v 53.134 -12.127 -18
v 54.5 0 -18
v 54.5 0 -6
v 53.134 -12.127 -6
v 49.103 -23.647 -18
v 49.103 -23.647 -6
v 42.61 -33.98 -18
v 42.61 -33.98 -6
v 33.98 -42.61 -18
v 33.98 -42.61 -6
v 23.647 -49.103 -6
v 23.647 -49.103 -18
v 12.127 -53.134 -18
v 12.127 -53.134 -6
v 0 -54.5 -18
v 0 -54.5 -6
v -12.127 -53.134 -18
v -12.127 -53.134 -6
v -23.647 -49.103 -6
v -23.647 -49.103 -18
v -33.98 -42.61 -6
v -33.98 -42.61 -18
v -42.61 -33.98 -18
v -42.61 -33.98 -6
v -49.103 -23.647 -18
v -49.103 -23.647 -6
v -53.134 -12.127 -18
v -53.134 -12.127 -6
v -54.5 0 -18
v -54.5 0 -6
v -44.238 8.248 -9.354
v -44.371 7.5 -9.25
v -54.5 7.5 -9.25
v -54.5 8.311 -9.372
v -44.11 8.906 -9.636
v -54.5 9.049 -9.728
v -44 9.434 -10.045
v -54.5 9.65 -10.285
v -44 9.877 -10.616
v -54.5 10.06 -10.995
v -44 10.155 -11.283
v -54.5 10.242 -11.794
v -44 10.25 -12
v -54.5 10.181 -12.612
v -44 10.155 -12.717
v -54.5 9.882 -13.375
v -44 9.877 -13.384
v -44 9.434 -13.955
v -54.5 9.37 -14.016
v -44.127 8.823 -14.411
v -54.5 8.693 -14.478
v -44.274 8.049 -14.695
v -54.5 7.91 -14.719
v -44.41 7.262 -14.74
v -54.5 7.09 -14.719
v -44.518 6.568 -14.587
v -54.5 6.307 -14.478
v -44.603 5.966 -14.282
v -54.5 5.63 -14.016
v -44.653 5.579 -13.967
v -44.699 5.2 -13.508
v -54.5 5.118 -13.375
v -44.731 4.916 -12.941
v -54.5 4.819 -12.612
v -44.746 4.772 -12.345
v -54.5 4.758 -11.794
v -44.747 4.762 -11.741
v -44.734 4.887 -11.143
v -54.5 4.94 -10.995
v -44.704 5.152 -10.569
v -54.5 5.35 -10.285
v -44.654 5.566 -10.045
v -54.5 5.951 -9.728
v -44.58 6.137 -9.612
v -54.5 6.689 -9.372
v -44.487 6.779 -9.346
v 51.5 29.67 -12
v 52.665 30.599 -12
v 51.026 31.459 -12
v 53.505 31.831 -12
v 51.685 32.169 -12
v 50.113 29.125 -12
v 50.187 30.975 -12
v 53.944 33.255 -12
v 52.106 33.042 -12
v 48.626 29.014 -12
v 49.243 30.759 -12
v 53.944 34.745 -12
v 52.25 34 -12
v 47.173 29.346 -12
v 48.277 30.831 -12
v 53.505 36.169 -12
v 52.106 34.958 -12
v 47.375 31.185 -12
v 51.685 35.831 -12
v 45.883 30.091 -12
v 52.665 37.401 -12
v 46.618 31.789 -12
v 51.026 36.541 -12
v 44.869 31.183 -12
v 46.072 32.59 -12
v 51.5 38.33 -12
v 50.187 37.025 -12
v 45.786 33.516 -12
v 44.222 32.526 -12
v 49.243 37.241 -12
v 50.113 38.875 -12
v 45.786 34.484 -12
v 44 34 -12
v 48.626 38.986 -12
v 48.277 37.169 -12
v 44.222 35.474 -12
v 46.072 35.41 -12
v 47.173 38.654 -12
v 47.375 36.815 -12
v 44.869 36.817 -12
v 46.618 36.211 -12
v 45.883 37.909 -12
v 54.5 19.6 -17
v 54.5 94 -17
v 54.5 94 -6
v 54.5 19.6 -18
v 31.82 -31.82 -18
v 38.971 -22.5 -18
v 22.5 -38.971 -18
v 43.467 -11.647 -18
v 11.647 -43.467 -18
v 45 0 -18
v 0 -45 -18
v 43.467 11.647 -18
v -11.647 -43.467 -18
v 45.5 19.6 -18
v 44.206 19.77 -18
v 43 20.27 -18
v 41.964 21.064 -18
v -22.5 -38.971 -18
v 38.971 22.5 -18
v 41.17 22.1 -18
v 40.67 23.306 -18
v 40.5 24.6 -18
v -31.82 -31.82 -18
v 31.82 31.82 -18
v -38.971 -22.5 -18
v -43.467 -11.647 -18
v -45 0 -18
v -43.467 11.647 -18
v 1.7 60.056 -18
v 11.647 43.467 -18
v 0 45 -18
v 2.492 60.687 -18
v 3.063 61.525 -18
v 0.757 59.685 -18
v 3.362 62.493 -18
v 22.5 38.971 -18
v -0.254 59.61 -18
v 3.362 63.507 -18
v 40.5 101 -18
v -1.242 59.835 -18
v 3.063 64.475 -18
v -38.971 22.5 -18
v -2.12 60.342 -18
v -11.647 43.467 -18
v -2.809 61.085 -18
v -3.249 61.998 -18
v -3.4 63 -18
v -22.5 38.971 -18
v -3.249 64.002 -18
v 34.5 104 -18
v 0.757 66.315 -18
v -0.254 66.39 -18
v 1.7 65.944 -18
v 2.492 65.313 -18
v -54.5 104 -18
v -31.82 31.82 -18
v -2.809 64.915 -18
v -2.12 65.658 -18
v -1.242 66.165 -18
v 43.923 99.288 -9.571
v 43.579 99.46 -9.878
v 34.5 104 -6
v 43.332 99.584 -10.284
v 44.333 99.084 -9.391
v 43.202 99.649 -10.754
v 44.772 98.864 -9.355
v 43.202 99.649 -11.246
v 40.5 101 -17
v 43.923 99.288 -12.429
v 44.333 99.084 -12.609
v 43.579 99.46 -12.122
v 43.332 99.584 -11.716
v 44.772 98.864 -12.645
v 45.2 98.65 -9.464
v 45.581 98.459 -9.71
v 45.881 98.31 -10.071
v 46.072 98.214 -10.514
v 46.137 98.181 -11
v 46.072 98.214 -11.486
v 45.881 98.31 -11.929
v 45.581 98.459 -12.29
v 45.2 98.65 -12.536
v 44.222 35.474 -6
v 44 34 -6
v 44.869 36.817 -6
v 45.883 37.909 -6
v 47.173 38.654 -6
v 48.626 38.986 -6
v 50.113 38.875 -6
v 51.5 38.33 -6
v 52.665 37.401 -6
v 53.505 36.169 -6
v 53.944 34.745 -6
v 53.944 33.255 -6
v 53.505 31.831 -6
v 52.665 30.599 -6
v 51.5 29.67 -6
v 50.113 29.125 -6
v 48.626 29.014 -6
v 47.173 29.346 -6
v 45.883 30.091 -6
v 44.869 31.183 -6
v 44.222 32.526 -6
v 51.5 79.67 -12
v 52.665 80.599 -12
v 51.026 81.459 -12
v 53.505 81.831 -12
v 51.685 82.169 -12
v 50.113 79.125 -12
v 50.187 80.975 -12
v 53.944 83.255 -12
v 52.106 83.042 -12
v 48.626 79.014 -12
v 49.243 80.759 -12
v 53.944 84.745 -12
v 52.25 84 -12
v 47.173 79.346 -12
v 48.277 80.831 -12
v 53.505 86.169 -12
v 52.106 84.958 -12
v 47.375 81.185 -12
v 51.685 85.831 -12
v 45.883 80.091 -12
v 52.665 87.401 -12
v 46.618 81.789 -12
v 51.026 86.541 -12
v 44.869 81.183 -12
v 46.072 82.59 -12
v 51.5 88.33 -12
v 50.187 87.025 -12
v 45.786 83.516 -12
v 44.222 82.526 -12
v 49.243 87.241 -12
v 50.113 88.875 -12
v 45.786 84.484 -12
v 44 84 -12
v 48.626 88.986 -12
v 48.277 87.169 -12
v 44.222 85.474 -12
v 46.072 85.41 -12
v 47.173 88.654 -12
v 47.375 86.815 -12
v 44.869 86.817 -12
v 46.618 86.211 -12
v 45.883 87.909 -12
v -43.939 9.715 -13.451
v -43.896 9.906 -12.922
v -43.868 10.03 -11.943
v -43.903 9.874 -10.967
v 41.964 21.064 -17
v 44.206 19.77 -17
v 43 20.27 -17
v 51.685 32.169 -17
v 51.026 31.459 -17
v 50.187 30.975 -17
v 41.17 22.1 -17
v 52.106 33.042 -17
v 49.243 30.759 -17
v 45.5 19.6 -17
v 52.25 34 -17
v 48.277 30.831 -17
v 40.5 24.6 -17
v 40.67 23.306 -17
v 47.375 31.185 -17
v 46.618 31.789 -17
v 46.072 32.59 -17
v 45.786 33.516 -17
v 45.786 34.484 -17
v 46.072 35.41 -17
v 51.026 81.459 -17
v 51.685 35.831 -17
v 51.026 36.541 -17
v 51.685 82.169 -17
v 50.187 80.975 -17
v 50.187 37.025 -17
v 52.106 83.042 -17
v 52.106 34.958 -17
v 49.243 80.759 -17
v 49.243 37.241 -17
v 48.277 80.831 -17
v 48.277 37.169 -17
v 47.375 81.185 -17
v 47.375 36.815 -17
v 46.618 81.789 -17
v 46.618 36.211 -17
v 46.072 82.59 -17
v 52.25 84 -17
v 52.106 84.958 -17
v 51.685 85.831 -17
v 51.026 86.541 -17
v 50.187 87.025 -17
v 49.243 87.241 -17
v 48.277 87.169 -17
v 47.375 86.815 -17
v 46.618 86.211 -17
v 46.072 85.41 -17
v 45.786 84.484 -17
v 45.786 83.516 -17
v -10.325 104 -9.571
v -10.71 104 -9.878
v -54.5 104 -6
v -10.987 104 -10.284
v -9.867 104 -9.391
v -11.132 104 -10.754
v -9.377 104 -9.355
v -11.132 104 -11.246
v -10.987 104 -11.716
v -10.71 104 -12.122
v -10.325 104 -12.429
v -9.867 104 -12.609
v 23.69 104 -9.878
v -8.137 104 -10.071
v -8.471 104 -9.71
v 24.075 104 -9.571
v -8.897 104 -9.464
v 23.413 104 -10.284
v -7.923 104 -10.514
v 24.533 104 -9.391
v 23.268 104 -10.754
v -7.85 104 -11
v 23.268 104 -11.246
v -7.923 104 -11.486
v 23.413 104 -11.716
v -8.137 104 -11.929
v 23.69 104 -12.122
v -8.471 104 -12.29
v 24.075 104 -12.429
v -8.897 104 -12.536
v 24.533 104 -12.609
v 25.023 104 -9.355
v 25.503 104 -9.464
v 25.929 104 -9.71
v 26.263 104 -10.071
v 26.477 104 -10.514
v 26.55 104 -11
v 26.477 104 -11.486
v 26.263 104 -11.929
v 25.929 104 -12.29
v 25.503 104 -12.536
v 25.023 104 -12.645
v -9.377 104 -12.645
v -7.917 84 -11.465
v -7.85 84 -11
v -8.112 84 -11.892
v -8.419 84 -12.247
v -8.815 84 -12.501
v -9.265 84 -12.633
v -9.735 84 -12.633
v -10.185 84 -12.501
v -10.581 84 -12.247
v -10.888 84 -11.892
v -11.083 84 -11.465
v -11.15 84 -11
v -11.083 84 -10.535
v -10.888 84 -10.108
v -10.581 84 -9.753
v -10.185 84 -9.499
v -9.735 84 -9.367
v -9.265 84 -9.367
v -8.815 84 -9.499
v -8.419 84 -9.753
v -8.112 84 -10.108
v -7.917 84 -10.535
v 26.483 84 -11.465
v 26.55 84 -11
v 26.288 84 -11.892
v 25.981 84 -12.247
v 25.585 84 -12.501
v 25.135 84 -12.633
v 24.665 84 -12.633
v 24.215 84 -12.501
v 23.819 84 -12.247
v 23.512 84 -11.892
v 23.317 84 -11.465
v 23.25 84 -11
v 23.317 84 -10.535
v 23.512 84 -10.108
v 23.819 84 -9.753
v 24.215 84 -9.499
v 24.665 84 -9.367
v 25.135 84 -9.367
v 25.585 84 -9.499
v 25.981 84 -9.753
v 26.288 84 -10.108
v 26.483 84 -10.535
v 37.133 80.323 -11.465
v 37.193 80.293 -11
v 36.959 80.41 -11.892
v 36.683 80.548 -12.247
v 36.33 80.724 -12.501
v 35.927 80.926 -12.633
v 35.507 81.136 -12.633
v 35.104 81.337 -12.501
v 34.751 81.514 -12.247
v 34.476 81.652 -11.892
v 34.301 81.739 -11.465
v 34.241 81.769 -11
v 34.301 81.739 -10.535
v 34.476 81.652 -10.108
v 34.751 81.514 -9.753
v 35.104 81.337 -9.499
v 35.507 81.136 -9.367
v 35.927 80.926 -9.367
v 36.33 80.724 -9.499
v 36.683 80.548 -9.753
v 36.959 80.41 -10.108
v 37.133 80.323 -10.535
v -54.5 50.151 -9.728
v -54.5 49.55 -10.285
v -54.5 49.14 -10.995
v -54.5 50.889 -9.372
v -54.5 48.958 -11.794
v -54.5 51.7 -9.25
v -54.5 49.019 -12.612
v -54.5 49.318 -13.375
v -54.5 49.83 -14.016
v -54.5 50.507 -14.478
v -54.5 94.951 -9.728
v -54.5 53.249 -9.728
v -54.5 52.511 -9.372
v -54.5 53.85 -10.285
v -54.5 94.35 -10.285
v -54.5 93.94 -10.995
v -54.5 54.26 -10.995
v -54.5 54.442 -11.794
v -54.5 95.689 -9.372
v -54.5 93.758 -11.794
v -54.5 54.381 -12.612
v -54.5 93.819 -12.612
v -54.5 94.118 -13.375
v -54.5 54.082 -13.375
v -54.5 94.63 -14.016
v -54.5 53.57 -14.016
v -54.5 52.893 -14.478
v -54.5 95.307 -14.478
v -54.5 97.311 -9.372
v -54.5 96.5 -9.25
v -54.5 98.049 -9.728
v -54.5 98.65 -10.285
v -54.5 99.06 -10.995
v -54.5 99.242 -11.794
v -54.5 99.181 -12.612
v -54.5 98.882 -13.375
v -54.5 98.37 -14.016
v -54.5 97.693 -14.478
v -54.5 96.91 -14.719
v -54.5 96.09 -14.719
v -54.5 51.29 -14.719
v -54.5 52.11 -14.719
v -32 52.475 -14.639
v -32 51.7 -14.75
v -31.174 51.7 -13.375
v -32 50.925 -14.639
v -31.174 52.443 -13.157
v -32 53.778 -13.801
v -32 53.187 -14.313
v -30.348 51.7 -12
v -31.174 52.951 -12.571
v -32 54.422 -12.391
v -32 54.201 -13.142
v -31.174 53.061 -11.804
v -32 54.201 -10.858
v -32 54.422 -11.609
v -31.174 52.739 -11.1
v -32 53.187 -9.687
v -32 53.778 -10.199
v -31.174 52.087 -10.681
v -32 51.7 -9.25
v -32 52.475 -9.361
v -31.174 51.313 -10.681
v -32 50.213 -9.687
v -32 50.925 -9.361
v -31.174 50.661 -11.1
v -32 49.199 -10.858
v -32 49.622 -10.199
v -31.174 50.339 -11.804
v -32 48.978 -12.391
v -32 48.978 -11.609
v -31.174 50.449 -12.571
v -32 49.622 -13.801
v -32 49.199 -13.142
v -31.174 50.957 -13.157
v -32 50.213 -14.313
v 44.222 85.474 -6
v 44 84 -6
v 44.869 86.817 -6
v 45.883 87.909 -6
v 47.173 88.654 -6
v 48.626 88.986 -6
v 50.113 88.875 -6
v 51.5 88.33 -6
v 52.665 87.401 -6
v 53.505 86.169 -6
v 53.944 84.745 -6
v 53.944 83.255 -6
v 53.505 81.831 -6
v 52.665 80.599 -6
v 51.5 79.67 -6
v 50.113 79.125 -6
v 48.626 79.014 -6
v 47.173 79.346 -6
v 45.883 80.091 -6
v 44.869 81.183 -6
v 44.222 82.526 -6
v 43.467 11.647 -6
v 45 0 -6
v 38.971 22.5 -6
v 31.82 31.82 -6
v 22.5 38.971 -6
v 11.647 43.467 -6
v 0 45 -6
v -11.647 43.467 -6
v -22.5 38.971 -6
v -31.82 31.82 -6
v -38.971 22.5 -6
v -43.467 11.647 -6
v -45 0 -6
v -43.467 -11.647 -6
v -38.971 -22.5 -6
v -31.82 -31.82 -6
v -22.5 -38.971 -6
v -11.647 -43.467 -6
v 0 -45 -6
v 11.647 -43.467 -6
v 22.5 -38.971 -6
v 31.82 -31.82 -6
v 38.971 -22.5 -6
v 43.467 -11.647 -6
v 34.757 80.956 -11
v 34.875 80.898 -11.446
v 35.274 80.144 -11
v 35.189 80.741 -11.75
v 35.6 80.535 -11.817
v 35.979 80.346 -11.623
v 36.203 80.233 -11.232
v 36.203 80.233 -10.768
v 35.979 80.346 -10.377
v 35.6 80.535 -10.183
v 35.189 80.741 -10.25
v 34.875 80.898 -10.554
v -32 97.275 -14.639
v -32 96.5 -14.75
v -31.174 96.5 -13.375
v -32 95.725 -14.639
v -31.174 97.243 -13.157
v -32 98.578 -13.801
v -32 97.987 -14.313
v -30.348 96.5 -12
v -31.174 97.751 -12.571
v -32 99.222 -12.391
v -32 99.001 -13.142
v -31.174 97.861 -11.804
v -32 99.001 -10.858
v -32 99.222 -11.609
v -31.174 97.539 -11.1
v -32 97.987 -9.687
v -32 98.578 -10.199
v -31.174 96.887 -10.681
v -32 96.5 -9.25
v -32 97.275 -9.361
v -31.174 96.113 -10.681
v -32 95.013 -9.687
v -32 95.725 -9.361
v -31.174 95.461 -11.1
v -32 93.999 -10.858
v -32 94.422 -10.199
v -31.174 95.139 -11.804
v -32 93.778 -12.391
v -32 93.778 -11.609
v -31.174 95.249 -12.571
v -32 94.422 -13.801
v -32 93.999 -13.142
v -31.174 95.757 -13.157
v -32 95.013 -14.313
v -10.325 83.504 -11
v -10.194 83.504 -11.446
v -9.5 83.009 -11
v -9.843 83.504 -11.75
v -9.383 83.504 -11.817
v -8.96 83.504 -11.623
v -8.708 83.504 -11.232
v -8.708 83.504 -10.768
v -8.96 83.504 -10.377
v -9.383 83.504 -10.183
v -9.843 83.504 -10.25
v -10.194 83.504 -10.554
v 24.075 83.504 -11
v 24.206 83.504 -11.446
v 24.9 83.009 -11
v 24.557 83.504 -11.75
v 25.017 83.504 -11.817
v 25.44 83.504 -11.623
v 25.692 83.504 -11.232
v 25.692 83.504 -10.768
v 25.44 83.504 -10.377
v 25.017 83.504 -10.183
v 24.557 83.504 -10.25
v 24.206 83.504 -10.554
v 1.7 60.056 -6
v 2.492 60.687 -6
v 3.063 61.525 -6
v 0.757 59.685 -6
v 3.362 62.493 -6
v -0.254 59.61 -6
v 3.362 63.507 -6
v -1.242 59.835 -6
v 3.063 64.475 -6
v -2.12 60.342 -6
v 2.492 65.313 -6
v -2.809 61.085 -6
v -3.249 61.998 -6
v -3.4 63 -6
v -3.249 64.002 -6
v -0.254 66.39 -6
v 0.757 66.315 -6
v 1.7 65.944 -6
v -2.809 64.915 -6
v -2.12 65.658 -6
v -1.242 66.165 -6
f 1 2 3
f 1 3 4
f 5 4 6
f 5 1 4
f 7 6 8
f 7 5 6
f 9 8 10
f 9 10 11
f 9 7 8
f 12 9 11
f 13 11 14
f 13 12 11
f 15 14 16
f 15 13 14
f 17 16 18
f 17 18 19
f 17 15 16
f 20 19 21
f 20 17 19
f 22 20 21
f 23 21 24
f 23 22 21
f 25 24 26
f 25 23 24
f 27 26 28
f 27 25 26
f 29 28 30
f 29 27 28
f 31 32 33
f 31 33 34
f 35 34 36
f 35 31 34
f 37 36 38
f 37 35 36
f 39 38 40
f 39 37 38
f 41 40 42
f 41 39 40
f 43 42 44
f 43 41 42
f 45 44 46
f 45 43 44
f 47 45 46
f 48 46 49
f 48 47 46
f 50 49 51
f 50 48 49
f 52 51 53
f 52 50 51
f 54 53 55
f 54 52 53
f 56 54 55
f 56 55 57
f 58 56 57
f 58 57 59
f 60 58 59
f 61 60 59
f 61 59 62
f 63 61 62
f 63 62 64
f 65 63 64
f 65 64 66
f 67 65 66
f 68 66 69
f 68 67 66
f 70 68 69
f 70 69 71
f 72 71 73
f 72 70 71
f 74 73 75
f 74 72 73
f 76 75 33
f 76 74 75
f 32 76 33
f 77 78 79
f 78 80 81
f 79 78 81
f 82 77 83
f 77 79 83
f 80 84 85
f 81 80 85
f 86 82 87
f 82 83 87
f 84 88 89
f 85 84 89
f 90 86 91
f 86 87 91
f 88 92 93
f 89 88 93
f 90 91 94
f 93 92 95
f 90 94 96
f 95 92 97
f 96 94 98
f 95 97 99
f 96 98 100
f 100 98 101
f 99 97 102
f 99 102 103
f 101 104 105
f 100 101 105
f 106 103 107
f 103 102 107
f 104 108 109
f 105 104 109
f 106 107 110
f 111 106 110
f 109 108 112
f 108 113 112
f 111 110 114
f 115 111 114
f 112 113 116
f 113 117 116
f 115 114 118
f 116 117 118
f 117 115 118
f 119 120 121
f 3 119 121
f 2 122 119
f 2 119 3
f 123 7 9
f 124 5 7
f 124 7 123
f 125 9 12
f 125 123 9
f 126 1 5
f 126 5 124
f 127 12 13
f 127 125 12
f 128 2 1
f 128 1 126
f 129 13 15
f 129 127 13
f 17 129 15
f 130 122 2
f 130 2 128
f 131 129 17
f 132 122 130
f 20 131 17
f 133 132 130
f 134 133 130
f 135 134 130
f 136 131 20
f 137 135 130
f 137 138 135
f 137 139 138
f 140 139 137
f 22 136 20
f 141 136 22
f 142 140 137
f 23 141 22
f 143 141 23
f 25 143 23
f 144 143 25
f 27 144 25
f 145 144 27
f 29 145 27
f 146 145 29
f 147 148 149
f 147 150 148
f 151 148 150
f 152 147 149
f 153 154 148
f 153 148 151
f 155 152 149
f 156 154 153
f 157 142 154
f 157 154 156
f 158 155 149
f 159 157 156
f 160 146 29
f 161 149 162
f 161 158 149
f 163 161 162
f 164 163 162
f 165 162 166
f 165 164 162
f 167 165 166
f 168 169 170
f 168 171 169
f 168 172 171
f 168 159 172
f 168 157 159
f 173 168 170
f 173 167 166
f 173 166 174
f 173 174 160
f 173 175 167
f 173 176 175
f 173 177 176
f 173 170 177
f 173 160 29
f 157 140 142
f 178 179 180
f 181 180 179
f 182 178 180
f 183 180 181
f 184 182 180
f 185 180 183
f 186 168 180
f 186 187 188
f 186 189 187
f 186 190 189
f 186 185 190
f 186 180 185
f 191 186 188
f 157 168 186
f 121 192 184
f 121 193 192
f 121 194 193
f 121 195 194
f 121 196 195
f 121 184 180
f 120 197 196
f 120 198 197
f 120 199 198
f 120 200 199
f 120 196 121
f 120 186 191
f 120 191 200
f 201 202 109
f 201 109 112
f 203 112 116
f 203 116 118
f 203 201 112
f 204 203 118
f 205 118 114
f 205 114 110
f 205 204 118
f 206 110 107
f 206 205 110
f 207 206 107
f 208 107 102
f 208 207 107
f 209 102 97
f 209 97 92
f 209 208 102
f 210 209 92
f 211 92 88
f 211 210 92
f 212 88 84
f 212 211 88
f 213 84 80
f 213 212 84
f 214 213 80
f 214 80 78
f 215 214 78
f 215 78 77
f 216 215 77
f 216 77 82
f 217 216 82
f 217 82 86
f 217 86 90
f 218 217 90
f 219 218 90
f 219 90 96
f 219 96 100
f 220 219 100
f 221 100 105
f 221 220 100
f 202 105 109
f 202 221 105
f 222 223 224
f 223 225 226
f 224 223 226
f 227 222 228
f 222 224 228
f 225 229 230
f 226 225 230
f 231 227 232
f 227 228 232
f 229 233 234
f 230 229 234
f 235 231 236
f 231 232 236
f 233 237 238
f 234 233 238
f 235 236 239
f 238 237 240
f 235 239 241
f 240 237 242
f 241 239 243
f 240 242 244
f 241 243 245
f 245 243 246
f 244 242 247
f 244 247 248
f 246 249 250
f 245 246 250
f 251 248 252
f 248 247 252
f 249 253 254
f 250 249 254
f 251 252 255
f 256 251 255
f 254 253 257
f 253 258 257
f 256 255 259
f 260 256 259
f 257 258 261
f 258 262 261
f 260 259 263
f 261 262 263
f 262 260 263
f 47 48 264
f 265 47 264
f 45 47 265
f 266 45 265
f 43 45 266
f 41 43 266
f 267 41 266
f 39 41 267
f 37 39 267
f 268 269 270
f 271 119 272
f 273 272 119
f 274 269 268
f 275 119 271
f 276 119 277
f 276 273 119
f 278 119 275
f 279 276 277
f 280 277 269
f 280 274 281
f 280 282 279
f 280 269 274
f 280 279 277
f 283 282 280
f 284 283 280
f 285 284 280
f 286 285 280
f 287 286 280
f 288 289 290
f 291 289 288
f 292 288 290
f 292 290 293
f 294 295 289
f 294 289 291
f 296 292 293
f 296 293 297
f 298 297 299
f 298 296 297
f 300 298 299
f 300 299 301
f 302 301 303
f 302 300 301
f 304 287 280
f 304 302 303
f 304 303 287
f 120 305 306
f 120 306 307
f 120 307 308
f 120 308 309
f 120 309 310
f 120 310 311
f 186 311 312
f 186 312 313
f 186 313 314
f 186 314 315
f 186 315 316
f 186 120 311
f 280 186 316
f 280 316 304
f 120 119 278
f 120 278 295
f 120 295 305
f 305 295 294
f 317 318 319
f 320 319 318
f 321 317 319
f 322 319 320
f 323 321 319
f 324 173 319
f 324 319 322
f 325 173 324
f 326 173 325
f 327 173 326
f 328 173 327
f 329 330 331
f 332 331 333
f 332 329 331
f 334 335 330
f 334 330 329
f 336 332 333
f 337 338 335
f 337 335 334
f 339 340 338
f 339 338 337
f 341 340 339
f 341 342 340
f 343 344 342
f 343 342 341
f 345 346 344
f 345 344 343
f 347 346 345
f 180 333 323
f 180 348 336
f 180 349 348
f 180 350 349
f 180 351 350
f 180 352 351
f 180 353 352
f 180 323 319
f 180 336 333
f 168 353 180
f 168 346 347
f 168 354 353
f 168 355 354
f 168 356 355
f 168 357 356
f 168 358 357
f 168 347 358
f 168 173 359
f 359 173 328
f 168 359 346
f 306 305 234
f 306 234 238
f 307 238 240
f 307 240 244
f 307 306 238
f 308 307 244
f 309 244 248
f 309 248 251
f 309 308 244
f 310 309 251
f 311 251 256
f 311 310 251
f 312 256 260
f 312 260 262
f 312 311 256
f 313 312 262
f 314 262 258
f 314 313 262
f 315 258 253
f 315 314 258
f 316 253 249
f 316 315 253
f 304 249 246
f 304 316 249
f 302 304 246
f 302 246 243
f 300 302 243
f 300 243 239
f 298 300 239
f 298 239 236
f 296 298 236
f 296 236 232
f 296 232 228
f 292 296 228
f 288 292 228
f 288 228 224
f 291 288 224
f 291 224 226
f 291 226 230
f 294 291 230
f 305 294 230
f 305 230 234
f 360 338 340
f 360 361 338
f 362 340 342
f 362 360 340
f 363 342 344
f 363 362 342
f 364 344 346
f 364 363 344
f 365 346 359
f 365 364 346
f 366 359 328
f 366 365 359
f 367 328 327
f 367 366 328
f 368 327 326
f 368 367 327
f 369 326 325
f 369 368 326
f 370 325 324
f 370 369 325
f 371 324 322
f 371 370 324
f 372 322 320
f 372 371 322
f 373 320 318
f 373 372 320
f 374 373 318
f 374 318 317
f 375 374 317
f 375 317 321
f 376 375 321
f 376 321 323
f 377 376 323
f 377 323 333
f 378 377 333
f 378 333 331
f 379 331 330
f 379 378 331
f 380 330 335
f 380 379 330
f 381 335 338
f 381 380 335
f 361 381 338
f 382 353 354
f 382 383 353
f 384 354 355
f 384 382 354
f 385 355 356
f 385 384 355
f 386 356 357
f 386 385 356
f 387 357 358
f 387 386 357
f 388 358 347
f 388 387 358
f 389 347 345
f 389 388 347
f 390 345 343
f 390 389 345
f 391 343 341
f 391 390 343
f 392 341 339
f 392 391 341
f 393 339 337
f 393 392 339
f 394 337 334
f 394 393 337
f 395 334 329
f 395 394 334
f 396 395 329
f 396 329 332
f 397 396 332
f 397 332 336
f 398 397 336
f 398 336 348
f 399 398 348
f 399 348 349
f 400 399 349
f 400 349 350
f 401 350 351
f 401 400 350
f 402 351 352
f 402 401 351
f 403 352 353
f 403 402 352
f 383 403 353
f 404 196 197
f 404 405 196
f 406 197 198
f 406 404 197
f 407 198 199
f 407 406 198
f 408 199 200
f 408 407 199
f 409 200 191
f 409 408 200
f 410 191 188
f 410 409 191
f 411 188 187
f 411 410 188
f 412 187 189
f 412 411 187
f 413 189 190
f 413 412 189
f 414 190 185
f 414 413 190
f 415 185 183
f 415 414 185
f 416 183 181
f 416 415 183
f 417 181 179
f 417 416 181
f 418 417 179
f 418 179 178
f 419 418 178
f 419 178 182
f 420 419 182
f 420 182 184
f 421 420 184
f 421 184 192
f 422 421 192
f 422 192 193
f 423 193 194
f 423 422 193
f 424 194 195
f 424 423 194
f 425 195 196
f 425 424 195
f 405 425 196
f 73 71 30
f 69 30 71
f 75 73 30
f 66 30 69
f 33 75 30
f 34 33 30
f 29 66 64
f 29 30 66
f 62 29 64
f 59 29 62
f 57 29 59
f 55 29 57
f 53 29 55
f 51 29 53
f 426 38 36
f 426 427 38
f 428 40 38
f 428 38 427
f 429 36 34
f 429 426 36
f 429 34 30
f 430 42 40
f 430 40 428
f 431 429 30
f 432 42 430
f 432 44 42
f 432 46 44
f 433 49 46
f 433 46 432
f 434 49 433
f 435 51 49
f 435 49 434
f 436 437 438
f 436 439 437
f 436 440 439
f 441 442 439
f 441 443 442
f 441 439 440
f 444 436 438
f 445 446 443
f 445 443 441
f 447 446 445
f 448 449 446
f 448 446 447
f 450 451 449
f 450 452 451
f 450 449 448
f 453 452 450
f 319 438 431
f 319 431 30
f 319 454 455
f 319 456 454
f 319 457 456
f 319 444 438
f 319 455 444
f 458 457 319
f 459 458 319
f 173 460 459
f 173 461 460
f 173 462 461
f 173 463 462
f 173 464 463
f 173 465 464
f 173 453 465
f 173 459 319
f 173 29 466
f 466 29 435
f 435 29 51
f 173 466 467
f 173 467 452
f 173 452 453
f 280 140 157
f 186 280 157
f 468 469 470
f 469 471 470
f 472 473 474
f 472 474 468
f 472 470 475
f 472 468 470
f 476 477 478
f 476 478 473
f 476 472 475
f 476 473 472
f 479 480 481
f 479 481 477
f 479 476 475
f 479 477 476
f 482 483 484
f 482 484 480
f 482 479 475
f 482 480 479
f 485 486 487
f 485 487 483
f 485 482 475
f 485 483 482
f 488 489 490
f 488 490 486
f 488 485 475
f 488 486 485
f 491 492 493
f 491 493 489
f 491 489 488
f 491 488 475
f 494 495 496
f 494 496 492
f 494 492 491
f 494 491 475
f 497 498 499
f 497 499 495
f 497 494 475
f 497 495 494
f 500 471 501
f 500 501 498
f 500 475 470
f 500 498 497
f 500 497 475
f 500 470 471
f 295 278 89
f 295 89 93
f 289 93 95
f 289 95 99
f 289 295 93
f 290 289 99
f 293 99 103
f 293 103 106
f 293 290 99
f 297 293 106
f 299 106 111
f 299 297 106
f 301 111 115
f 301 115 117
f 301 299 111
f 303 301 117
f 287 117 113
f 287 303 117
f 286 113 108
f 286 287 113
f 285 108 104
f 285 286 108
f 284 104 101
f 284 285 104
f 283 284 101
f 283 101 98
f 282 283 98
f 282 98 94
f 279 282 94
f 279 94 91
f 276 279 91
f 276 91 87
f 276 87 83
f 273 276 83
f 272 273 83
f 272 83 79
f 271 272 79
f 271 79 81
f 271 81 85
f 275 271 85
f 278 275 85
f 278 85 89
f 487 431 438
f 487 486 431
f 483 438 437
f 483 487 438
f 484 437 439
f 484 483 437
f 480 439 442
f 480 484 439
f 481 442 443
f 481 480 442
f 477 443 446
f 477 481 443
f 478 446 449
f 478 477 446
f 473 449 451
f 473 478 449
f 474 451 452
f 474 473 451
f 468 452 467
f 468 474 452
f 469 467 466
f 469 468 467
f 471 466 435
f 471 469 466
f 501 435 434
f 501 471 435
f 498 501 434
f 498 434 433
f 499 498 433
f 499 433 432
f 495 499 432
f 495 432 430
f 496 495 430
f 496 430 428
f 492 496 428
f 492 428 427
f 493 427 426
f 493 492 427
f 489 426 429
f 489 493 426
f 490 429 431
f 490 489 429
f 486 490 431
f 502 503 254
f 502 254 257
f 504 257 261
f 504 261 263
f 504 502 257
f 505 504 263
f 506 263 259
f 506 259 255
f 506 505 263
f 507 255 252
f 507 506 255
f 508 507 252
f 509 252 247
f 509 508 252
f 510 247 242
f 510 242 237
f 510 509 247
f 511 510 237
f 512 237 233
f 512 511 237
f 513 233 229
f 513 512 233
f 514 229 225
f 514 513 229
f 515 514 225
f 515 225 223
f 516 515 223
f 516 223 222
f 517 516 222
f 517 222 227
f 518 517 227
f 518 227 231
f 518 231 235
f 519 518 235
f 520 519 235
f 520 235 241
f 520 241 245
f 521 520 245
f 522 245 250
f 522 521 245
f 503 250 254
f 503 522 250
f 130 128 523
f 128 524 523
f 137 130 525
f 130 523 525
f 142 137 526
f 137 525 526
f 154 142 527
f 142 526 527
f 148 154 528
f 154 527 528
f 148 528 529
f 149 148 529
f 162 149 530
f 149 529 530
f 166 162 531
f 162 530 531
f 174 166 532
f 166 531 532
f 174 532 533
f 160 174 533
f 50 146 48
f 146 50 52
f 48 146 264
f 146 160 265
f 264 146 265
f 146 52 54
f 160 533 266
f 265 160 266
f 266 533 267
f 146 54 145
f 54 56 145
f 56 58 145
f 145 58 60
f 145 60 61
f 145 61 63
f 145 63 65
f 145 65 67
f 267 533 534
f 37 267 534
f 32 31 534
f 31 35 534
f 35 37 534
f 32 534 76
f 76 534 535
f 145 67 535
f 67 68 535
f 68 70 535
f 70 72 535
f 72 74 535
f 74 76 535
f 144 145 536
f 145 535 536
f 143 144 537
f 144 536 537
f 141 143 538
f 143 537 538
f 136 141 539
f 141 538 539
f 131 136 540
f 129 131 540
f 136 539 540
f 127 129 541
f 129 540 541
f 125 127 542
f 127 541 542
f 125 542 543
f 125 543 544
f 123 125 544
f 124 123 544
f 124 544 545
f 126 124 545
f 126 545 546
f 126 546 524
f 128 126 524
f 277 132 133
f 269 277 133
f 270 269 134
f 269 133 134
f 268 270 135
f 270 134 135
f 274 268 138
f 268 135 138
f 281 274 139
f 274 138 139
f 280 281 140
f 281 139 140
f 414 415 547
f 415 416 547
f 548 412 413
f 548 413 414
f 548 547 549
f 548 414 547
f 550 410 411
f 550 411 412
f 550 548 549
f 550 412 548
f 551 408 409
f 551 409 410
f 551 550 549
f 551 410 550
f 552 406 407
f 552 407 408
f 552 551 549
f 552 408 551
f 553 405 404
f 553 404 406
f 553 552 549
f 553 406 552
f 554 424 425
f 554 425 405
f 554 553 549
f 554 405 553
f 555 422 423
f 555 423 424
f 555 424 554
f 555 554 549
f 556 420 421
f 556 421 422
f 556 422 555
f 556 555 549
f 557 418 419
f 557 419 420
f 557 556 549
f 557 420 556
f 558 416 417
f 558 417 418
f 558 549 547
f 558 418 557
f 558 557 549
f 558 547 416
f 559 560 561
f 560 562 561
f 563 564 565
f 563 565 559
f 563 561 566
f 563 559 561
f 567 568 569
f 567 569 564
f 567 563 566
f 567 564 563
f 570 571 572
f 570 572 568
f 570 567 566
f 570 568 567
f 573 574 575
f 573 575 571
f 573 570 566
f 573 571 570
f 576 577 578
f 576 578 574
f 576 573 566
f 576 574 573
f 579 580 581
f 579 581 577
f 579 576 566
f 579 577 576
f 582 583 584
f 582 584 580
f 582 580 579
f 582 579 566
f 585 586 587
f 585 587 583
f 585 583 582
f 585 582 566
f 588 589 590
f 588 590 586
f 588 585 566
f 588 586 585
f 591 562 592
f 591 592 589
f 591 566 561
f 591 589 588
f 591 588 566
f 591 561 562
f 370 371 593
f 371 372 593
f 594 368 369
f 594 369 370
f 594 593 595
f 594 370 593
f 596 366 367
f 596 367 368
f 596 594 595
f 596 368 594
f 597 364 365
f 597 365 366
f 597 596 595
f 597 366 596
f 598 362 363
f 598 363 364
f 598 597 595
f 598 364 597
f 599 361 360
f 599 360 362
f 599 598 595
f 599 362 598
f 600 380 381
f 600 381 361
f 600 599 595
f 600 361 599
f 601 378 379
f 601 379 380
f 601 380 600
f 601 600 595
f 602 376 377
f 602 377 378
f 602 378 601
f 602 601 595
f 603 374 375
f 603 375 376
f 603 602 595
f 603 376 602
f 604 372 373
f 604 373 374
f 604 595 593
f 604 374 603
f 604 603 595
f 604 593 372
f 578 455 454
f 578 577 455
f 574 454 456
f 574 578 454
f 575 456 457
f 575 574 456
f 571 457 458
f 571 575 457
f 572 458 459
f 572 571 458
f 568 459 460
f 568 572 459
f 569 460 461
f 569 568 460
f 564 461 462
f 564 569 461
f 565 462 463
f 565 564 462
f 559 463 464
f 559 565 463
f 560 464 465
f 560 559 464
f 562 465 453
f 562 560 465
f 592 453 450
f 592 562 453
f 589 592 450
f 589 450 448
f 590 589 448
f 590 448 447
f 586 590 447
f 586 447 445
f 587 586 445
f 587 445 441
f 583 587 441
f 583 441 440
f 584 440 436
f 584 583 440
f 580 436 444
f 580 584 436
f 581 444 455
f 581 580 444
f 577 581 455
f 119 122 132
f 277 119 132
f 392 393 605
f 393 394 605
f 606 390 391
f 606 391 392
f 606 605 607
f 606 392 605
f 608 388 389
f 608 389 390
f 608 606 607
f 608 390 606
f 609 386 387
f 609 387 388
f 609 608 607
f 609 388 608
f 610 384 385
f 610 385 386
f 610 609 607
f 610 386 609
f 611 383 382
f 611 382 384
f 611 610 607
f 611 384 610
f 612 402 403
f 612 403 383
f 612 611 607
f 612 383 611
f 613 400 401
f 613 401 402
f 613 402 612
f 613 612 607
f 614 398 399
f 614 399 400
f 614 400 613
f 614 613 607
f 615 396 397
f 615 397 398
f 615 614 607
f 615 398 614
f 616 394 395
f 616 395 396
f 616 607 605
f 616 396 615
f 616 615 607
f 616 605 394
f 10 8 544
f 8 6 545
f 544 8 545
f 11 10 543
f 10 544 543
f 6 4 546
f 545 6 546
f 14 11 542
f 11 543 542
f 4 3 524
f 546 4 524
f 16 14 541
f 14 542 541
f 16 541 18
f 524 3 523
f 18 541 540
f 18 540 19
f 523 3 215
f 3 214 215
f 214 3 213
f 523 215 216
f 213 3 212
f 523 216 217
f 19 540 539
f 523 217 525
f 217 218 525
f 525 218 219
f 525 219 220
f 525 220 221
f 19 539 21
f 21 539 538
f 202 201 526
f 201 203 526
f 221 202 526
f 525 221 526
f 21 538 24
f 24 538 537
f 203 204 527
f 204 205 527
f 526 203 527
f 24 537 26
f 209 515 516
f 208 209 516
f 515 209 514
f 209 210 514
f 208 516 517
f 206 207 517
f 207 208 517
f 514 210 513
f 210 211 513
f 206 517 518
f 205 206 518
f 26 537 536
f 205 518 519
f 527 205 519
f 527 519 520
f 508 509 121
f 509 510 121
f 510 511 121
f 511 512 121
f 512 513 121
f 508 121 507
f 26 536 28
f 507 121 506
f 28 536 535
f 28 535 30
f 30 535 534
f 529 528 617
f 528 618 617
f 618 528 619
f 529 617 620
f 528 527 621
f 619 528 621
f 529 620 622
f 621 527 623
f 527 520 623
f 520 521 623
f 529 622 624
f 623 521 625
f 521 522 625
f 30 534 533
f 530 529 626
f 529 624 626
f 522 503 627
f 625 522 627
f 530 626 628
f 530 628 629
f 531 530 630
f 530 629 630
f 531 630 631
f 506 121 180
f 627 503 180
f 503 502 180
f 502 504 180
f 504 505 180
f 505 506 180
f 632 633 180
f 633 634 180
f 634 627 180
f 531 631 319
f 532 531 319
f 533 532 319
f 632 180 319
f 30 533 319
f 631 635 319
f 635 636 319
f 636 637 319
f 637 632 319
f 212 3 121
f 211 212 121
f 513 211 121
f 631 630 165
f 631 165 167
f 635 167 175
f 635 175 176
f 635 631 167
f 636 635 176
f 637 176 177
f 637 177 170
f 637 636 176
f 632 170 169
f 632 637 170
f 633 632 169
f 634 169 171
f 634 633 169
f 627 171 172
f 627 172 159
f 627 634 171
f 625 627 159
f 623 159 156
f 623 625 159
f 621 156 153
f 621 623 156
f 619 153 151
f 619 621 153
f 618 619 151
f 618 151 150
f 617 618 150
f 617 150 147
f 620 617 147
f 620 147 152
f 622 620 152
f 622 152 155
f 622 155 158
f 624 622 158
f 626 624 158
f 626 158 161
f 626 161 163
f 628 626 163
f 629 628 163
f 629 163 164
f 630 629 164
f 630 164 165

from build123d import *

# Parameters (mm, degrees)
CROQUIS1_R                    = 45
SALIENTE_EXTRUIR1_DEPTH       = 6
TALADRO_ROSCADO_M41_D         = 3.3
TALADRO_ROSCADO_M41_DEPTH     = 20
TALADRO_ROSCADO_M41_TIP       = 0.991420021
TALADRO_ROSCADO_M42_D         = 3.3
TALADRO_ROSCADO_M42_DEPTH     = 20
TALADRO_ROSCADO_M42_TIP       = 0.991420021
CORTAR_EXTRUIR1_DEPTH         = 1
CROQUIS7_R                    = 3.25
CORTAR_EXTRUIR2_DEPTH         = 37.7
CROQUIS8_R                    = 5
CORTAR_EXTRUIR3_DEPTH         = 6
TALADRO_ROSCADO_M6X0_51_D     = 5.5
TALADRO_ROSCADO_M6X0_51_DEPTH = 22.5
TALADRO_ROSCADO_M6X0_51_TIP   = 1.652366702
TALADRO_ROSCADO_M6X0_52_D     = 5.5
TALADRO_ROSCADO_M6X0_52_DEPTH = 10.5
TALADRO_ROSCADO_M6X0_52_TIP   = 1.652366702
TALADRO_ROSCADO_M81_D         = 6.8


with BuildPart() as part:
    # Croquis1 → Saliente-Extruir1 (new body, symmetric)
    with BuildSketch(Plane.XY):
        with BuildLine():
            Line((-54.5, 0), (-54.5, 104))
            Line((-54.5, 104), (34.5, 104))
            Line((34.5, 104), (54.5, 94))
            Line((54.5, 94), (54.5, 0))
            ThreePointArc((54.5, 0), (0, -54.5), (-54.5, 0))
        make_face()
        Circle(CROQUIS1_R, mode=Mode.SUBTRACT)
    extrude(amount=SALIENTE_EXTRUIR1_DEPTH, both=True)

    # Taladro roscado M41
    with Locations(Plane(origin=(48.5, 97, 0), x_dir=(-0.894427191, 0.447213595, 0), z_dir=(0.447213595, 0.894427191, 0))):
        with Locations((4.291796068, -1)):
            Hole(TALADRO_ROSCADO_M41_D / 2, depth=TALADRO_ROSCADO_M41_DEPTH)
            with Locations((0, 0, -(TALADRO_ROSCADO_M41_DEPTH + TALADRO_ROSCADO_M41_TIP / 2))):  # 118° drill point
                Cone(0, TALADRO_ROSCADO_M41_D / 2, TALADRO_ROSCADO_M41_TIP, mode=Mode.SUBTRACT)

    # Taladro roscado M42
    with Locations(Plane(origin=(0, 104, 0), x_dir=(-1, 0, 0), z_dir=(0, 1, 0))):
        with Locations((9.5, -1), (-24.9, -1)):
            Hole(TALADRO_ROSCADO_M42_D / 2, depth=TALADRO_ROSCADO_M42_DEPTH)
            with Locations((0, 0, -(TALADRO_ROSCADO_M42_DEPTH + TALADRO_ROSCADO_M42_TIP / 2))):  # 118° drill point
                Cone(0, TALADRO_ROSCADO_M42_D / 2, TALADRO_ROSCADO_M42_TIP, mode=Mode.SUBTRACT)

    # Croquis6 → Cortar-Extruir1 (cut)
    with BuildSketch(Plane.XY.offset(6)):
        with BuildLine():
            Line((40.5, 104), (65.659367038, 104))
            Line((65.659367038, 104), (65.659367038, 19.6))
            Line((65.659367038, 19.6), (45.5, 19.6))
            ThreePointArc((45.5, 19.6), (41.964466094, 21.064466094), (40.5, 24.6))
            Line((40.5, 24.6), (40.5, 104))
        make_face()
    extrude(amount=-CORTAR_EXTRUIR1_DEPTH, mode=Mode.SUBTRACT)

    # Croquis7 → Cortar-Extruir2 (cut)
    with BuildSketch(Plane.XY.offset(5)):
        with Locations((49, 84)):
            Circle(CROQUIS7_R)
        with Locations((49, 34)):
            Circle(CROQUIS7_R)
    extrude(amount=-CORTAR_EXTRUIR2_DEPTH, mode=Mode.SUBTRACT)

    # Croquis8 → Cortar-Extruir3 (cut)
    with BuildSketch(Plane(origin=(0, 0, -6), x_dir=(-1, 0, 0), z_dir=(0, 0, -1))):
        with Locations((-49, 84)):
            Circle(CROQUIS8_R)
        with Locations((-49, 34)):
            Circle(CROQUIS8_R)
    extrude(amount=-CORTAR_EXTRUIR3_DEPTH, mode=Mode.SUBTRACT)

    # Taladro roscado M6x0.51
    with Locations(Plane.ZY.offset(54.5)):
        with Locations((0, 96.5), (0, 51.7)):
            Hole(TALADRO_ROSCADO_M6X0_51_D / 2, depth=TALADRO_ROSCADO_M6X0_51_DEPTH)
            with Locations((0, 0, -(TALADRO_ROSCADO_M6X0_51_DEPTH + TALADRO_ROSCADO_M6X0_51_TIP / 2))):  # 118° drill point
                Cone(0, TALADRO_ROSCADO_M6X0_51_D / 2, TALADRO_ROSCADO_M6X0_51_TIP, mode=Mode.SUBTRACT)

    # Taladro roscado M6x0.52
    with Locations(Plane.ZY.offset(54.5)):
        with Locations((0, 7.5)):
            Hole(TALADRO_ROSCADO_M6X0_52_D / 2, depth=TALADRO_ROSCADO_M6X0_52_DEPTH)
            with Locations((0, 0, -(TALADRO_ROSCADO_M6X0_52_DEPTH + TALADRO_ROSCADO_M6X0_52_TIP / 2))):  # 118° drill point
                Cone(0, TALADRO_ROSCADO_M6X0_52_D / 2, TALADRO_ROSCADO_M6X0_52_TIP, mode=Mode.SUBTRACT)

    # Taladro roscado M81 (through all)
    with Locations(Plane.XY.offset(6)):
        with Locations((0, 63)):
            Hole(TALADRO_ROSCADO_M81_D / 2)


with BuildPart() as body_2:
    # Simetría1: mirrored copy
    add(part.part.mirror(Plane.XY.offset(-6)))


solid = body_2.part
